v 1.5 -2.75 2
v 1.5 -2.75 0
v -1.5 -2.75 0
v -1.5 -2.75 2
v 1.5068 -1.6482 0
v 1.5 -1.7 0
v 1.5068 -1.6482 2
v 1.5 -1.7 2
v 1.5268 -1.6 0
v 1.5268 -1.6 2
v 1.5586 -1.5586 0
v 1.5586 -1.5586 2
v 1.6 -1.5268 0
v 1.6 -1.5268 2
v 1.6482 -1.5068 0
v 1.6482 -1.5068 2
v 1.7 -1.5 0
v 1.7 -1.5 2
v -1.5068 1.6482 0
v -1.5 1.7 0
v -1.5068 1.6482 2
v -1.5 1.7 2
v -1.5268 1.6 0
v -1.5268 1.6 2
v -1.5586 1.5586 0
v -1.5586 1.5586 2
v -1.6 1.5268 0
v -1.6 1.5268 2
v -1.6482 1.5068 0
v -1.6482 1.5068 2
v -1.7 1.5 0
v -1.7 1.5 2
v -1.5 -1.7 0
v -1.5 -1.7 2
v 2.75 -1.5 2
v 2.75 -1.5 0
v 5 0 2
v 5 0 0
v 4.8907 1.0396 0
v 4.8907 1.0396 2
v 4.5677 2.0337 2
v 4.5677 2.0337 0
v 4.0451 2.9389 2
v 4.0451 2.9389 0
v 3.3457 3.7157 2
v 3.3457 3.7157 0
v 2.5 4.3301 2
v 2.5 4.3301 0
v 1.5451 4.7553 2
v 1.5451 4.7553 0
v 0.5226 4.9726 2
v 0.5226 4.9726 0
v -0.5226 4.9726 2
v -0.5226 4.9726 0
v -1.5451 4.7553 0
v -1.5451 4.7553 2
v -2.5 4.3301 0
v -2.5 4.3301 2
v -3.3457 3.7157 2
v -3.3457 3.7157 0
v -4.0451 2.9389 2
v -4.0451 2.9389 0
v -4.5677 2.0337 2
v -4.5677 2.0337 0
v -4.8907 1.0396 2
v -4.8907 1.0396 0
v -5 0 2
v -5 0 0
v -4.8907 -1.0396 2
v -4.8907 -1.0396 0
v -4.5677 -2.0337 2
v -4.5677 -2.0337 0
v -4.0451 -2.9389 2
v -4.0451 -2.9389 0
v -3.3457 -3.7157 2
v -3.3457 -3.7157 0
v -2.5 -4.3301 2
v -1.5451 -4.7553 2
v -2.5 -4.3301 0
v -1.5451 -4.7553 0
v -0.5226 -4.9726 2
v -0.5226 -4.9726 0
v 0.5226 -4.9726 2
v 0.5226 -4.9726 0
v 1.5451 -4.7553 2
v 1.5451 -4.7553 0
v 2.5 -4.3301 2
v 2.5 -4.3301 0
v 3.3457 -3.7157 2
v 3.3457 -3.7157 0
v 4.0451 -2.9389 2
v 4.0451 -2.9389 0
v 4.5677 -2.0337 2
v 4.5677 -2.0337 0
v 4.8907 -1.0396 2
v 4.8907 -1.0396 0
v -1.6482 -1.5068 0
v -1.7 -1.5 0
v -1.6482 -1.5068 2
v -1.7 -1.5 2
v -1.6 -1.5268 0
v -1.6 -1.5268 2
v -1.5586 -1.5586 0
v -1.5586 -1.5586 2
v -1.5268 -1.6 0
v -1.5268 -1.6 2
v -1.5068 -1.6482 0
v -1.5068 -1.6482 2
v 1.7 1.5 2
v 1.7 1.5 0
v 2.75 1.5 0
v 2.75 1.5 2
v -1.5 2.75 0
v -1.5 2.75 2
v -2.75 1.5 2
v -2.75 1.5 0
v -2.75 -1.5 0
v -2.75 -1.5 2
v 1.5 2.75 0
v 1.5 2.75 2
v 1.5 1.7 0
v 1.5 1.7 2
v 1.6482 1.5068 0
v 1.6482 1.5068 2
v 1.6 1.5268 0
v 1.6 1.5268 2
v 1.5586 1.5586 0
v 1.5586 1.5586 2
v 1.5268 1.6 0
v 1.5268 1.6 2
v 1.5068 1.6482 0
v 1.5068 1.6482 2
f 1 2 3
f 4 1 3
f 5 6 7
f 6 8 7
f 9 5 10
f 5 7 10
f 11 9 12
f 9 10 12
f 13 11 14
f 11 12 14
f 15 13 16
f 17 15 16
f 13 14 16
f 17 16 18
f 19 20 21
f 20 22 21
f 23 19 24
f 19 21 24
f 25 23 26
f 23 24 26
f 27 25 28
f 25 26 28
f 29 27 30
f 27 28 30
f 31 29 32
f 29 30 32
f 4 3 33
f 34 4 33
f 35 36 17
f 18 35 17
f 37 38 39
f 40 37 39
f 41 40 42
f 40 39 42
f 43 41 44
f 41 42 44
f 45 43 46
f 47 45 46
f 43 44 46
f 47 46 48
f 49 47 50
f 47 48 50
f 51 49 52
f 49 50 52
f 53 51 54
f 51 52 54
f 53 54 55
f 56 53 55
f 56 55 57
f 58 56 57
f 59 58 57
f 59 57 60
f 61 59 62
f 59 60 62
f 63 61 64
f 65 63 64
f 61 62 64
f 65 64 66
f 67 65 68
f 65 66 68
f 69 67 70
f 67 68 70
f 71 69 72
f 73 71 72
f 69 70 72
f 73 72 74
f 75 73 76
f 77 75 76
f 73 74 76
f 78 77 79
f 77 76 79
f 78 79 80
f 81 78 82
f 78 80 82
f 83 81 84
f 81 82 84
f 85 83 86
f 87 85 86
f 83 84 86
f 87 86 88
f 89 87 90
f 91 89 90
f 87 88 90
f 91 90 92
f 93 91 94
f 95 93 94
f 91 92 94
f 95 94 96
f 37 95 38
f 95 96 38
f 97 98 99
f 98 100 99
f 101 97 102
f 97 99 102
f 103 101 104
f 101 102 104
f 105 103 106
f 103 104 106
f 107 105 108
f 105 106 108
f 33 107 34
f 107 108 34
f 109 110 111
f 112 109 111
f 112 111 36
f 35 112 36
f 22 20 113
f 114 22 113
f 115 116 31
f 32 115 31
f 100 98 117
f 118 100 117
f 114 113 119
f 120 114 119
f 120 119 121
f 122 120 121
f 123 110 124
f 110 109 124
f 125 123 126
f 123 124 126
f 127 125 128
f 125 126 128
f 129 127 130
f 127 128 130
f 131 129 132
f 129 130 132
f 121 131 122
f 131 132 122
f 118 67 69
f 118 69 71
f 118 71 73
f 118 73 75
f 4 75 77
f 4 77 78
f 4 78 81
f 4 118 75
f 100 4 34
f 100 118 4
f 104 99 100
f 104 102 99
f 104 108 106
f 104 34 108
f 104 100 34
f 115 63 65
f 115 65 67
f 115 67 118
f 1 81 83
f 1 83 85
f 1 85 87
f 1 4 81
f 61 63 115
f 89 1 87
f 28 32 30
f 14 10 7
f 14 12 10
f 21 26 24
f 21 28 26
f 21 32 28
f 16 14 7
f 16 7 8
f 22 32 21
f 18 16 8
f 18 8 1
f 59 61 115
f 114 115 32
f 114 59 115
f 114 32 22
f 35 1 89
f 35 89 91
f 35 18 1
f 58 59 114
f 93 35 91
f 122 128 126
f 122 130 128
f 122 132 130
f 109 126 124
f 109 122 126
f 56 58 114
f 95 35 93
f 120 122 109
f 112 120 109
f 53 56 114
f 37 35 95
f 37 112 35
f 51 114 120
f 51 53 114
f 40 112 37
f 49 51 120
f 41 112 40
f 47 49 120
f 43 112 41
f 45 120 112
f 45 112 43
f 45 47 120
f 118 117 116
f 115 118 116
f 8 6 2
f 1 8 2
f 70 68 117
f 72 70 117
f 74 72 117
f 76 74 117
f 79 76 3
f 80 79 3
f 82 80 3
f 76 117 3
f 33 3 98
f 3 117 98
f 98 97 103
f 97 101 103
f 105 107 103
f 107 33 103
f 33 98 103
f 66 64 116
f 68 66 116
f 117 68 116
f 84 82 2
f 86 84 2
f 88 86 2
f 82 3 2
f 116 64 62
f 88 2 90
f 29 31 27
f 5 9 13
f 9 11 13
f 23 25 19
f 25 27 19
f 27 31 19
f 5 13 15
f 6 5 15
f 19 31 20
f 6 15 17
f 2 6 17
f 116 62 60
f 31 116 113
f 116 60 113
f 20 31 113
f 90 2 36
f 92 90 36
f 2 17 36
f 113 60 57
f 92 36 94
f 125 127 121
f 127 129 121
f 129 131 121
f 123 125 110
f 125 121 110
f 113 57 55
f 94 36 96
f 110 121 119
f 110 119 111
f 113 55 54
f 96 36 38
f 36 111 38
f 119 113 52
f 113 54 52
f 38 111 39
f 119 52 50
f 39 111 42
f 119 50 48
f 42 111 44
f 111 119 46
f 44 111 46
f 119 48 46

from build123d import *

# Parameters (mm, degrees)
SKETCH1_R           = 5
BOSS_EXTRUDE2_DEPTH = 2
FILLET2_R           = 0.2


with BuildPart() as part:
    # Sketch1 → Boss-Extrude2 (new body)
    with BuildSketch(Plane.XY):
        Circle(SKETCH1_R)
        Polygon((-2.75, -1.5), (-2.75, 1.5), (-1.5, 1.5), (-1.5, 2.75), (1.5, 2.75), (1.5, 1.5), (2.75, 1.5), (2.75, -1.5), (1.5, -1.5), (1.5, -2.75), (-1.5, -2.75), (-1.5, -1.5), align=None, mode=Mode.SUBTRACT)
    extrude(amount=BOSS_EXTRUDE2_DEPTH)

    # Fillet2
    fillet2_edges = [part.edges().sort_by_distance(p)[0] for p in [
        (-1.5, 1.5, 1),
        (-1.5, -1.5, 1),
        (1.5, -1.5, 1),
        (1.5, 1.5, 1),
    ]]
    fillet(fillet2_edges, radius=FILLET2_R)


solid = part.part
